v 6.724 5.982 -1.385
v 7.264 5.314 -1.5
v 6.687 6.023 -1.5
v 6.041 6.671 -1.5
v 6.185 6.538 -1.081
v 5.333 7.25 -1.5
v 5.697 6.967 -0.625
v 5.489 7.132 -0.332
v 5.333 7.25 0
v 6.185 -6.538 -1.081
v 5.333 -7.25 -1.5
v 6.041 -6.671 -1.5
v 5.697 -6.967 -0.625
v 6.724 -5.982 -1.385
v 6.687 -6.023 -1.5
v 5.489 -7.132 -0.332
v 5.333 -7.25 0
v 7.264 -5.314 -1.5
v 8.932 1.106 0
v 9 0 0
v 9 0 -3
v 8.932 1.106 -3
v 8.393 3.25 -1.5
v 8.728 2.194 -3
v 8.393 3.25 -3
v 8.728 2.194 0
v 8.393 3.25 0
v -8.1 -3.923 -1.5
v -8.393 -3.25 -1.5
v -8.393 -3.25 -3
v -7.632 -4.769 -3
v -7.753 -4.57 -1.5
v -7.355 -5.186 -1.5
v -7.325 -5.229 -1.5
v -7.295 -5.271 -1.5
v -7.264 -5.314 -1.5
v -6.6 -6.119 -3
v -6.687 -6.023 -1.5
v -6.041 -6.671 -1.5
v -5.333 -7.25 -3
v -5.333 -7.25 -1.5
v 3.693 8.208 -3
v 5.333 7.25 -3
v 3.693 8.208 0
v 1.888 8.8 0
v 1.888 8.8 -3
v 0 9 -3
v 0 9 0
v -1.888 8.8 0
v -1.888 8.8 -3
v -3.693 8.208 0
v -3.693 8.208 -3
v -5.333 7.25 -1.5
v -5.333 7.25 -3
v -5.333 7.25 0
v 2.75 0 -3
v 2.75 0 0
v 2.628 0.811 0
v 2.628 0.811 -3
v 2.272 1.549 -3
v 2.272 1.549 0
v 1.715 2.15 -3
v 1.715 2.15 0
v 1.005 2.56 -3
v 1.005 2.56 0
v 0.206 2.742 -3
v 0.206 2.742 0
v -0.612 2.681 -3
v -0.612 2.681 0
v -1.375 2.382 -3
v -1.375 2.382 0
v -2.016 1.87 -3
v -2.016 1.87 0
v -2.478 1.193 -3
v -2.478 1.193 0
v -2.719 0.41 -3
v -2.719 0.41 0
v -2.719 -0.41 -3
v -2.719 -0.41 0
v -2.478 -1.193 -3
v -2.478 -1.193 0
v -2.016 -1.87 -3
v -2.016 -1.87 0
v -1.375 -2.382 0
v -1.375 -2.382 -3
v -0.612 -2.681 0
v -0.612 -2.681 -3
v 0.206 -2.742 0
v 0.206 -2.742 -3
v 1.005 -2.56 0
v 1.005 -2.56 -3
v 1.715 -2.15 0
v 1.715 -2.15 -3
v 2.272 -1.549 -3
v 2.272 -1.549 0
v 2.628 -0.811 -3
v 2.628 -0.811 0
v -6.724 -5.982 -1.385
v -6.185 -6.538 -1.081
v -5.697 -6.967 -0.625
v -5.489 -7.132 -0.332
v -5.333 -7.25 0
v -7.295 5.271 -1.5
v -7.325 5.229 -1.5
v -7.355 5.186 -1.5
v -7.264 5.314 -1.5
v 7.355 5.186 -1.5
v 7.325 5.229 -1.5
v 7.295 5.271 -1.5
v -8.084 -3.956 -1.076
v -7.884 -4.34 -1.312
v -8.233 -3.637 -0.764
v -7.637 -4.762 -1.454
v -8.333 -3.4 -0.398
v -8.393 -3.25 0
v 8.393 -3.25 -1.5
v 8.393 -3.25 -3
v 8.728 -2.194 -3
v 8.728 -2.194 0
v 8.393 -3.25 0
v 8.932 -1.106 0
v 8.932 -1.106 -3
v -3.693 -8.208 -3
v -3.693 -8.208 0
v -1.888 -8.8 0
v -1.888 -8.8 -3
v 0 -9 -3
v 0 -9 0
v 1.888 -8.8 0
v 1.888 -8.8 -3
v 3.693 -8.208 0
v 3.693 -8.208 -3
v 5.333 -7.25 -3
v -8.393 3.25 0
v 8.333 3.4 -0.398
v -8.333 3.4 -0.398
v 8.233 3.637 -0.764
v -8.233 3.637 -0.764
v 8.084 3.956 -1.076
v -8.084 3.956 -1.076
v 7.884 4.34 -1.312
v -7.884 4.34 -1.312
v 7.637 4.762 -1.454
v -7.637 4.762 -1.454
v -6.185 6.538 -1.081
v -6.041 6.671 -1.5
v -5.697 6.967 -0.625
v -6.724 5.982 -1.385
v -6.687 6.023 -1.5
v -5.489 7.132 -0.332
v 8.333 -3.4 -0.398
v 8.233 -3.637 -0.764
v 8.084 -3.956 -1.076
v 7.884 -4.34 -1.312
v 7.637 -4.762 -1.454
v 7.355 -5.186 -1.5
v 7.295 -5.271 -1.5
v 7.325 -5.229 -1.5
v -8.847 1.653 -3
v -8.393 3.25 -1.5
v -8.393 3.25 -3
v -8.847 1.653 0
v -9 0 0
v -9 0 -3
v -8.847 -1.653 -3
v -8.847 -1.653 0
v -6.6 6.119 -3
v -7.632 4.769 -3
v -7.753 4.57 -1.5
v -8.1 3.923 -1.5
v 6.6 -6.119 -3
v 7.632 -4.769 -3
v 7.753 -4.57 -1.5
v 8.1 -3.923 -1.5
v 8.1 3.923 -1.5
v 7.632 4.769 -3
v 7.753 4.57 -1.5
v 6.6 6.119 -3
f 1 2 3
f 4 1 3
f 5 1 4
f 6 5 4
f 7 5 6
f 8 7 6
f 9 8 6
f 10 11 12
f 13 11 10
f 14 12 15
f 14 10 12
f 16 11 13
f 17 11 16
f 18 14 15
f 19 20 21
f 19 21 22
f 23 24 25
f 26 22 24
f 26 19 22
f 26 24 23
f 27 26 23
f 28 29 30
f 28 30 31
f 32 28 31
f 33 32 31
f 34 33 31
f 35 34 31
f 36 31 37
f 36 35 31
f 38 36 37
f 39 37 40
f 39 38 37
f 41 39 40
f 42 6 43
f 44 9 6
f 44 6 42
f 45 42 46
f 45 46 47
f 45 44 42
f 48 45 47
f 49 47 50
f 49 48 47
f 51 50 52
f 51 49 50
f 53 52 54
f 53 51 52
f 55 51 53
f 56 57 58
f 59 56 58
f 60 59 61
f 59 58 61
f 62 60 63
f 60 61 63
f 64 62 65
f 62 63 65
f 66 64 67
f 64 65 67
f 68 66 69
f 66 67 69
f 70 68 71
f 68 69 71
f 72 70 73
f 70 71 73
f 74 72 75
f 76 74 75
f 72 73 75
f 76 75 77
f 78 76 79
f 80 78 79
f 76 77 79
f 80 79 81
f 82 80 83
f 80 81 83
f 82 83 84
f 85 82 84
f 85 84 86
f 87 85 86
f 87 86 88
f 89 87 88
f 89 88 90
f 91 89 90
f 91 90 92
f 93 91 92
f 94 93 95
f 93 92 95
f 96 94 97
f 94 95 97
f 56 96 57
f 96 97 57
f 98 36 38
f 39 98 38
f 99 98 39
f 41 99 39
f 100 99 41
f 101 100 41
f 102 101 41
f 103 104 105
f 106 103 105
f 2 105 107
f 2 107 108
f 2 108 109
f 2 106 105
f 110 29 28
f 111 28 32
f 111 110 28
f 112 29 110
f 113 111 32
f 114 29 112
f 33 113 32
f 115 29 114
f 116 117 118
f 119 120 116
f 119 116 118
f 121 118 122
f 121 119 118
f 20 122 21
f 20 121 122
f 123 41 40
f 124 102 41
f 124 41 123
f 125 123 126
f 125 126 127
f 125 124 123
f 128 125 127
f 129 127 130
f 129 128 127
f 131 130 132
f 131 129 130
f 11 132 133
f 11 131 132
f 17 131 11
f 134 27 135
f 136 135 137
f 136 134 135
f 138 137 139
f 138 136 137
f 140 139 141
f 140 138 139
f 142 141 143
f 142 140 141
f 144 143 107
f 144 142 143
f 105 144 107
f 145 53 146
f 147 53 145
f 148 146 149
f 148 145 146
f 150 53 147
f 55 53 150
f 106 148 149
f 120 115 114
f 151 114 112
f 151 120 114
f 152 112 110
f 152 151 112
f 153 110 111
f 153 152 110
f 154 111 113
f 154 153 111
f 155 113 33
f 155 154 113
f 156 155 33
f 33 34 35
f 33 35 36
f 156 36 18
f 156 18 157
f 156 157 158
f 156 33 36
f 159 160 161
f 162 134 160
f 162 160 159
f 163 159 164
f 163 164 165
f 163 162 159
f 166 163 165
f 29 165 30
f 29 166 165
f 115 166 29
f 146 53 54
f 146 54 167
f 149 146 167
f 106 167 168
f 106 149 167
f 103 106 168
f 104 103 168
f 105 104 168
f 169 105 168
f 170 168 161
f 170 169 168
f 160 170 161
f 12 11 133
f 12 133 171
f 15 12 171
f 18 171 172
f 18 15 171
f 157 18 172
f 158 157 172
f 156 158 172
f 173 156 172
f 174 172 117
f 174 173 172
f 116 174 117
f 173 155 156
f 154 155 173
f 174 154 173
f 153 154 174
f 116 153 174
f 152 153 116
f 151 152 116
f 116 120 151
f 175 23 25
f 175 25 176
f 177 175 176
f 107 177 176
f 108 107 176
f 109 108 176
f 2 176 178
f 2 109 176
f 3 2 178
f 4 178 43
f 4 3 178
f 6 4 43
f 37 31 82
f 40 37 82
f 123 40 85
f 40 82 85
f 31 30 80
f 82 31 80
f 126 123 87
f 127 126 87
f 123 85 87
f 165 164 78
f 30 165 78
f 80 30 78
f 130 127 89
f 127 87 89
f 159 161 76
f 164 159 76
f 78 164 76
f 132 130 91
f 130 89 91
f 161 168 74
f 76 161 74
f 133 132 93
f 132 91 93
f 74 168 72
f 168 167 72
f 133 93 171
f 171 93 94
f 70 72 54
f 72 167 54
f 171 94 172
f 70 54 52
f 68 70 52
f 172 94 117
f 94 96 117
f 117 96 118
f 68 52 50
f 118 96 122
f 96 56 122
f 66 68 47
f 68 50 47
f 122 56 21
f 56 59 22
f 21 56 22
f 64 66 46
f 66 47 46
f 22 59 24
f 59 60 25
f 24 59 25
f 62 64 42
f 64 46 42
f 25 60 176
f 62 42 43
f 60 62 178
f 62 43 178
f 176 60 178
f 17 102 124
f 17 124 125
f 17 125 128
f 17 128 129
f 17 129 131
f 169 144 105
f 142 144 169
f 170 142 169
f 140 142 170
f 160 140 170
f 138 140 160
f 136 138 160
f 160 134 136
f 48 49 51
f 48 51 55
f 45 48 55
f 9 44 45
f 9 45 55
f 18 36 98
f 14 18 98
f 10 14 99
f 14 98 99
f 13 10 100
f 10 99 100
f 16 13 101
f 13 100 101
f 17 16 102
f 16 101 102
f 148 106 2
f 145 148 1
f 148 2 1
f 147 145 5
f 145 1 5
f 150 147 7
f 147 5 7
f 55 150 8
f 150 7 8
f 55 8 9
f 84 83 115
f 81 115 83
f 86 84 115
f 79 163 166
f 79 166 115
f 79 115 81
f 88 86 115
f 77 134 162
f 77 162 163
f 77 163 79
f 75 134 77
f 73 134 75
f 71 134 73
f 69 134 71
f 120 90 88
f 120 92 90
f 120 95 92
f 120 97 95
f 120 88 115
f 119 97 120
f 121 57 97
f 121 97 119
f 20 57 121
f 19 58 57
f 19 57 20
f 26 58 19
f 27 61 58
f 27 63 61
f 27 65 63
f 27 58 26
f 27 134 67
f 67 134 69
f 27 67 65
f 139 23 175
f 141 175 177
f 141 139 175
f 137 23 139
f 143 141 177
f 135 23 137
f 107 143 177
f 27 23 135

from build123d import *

# Parameters (mm, degrees)
F0_R         = 2.75
F1_DEPTH     = 3
F2_DEPTH     = 1.5
F3_T4_DEPTH  = 26.4678686971
F3_S5_R      = 9
F3_T6_DEPTH  = 15
F3_T10_DEPTH = 20.3478228694
F3_S11_R     = 9
F3_T12_DEPTH = 12
F3_T16_DEPTH = 26.4678686971
F3_S17_R     = 9
F3_T18_DEPTH = 15
F3_T22_DEPTH = 20.3478228694
F3_S23_R     = 9
F3_T24_DEPTH = 12


# Not quite as in the source:
# - a fillet or chamfer that OpenCascade refuses, or shapes differently, is made with other operations: its cross-section is extruded or revolved along the edge and cut away or added


with BuildPart() as f1:
    # F0 (on Top) → F1 (new body)
    with BuildSketch(Plane.XY):
        with BuildLine():
            Line((-5.3326822519, 7.25), (5.3326822519, 7.25))
            ThreePointArc((5.3326822519, 7.25), (0, 9), (-5.3326822519, 7.25))
        make_face()
        with BuildLine():
            Line((-8.3927051658, 3.25), (8.3927051658, 3.25))
            ThreePointArc((8.3927051658, 3.25), (7.1481861295, 5.4684033372), (5.3326822519, 7.25))
            Line((5.3326822519, 7.25), (-5.3326822519, 7.25))
            ThreePointArc((-5.3326822519, 7.25), (-7.1481861295, 5.4684033372), (-8.3927051658, 3.25))
        make_face()
        with BuildLine():
            ThreePointArc((5.3326822519, -7.25), (7.1481861295, -5.4684033372), (8.3927051658, -3.25))
            Line((8.3927051658, -3.25), (-8.3927051658, -3.25))
            ThreePointArc((-8.3927051658, -3.25), (-7.1481861295, -5.4684033372), (-5.3326822519, -7.25))
            Line((-5.3326822519, -7.25), (5.3326822519, -7.25))
        make_face()
        with BuildLine():
            ThreePointArc((-5.3326822519, -7.25), (0, -9), (5.3326822519, -7.25))
            Line((5.3326822519, -7.25), (-5.3326822519, -7.25))
        make_face()
        with BuildLine():
            ThreePointArc((8.3927051658, -3.25), (8.8468736425, -1.6531263575), (9, 0))
            ThreePointArc((9, 0), (8.8468736425, 1.6531263575), (8.3927051658, 3.25))
            Line((8.3927051658, 3.25), (-8.3927051658, 3.25))
            ThreePointArc((-8.3927051658, 3.25), (-9, 0), (-8.3927051658, -3.25))
            Line((-8.3927051658, -3.25), (8.3927051658, -3.25))
        make_face()
        Circle(F0_R, mode=Mode.SUBTRACT)
    extrude(amount=-F1_DEPTH)

    # F0 (on Top) → F2 (cut)
    with BuildSketch(Plane.XY):
        with BuildLine():
            Line((-8.3927051658, 3.25), (8.3927051658, 3.25))
            ThreePointArc((8.3927051658, 3.25), (7.1481861295, 5.4684033372), (5.3326822519, 7.25))
            Line((5.3326822519, 7.25), (-5.3326822519, 7.25))
            ThreePointArc((-5.3326822519, 7.25), (-7.1481861295, 5.4684033372), (-8.3927051658, 3.25))
        make_face()
        with BuildLine():
            ThreePointArc((5.3326822519, -7.25), (7.1481861295, -5.4684033372), (8.3927051658, -3.25))
            Line((8.3927051658, -3.25), (-8.3927051658, -3.25))
            ThreePointArc((-8.3927051658, -3.25), (-7.1481861295, -5.4684033372), (-5.3326822519, -7.25))
            Line((-5.3326822519, -7.25), (5.3326822519, -7.25))
        make_face()
    extrude(amount=-F2_DEPTH, mode=Mode.SUBTRACT)

    # F3: fillet of radius 2 on 4 edges, made by hand


with BuildPart() as f3_tool2:
    # F3_s3 → F3_t4 (new body)
    with BuildSketch(Plane.YZ.offset(-13.2339343486)):
        with BuildLine():
            ThreePointArc((3.25, 0), (3.9617468017, -1.0811388301), (5.1864916731, -1.5))
            Line((5.1864916731, -1.5), (3.25, -1.5))
            Line((3.25, -1.5), (3.25, 0))
        make_face()
    extrude(amount=F3_T4_DEPTH)

    # F3_s5 → F3_t6 (intersect, symmetric)
    with BuildSketch(Plane.XY.offset(-0.8)):
        Circle(F3_S5_R)
    extrude(amount=F3_T6_DEPTH, both=True, mode=Mode.INTERSECT)


with BuildPart() as f1_1:
    add(f1.part)

    # F3_t1: union F3_tool2
    add(f3_tool2.part)


with BuildPart() as f3_tool8:
    # F3_s9 → F3_t10 (new body)
    with BuildSketch(Plane.YZ.offset(10.1739114347)):
        with BuildLine():
            ThreePointArc((5.3135083269, -1.5), (6.5382531983, -1.0811388301), (7.25, 0))
            Line((7.25, 0), (7.25, -1.5))
            Line((7.25, -1.5), (5.3135083269, -1.5))
        make_face()
    extrude(amount=-F3_T10_DEPTH)

    # F3_s11 → F3_t12 (intersect, symmetric)
    with BuildSketch(Plane.XY.offset(-0.8)):
        Circle(F3_S11_R)
    extrude(amount=F3_T12_DEPTH, both=True, mode=Mode.INTERSECT)


with BuildPart() as f1_2:
    add(f1_1.part)

    # F3_t7: union F3_tool8
    add(f3_tool8.part)


with BuildPart() as f3_tool14:
    # F3_s15 → F3_t16 (new body)
    with BuildSketch(Plane.YZ.offset(13.2339343486)):
        with BuildLine():
            ThreePointArc((-3.25, 0), (-3.9617468017, -1.0811388301), (-5.1864916731, -1.5))
            Line((-5.1864916731, -1.5), (-3.25, -1.5))
            Line((-3.25, -1.5), (-3.25, 0))
        make_face()
    extrude(amount=-F3_T16_DEPTH)

    # F3_s17 → F3_t18 (intersect, symmetric)
    with BuildSketch(Plane.XY.offset(-0.8)):
        Circle(F3_S17_R)
    extrude(amount=F3_T18_DEPTH, both=True, mode=Mode.INTERSECT)


with BuildPart() as f1_3:
    add(f1_2.part)

    # F3_t13: union F3_tool14
    add(f3_tool14.part)


with BuildPart() as f3_tool20:
    # F3_s21 → F3_t22 (new body)
    with BuildSketch(Plane.YZ.offset(-10.1739114347)):
        with BuildLine():
            ThreePointArc((-5.3135083269, -1.5), (-6.5382531983, -1.0811388301), (-7.25, 0))
            Line((-7.25, 0), (-7.25, -1.5))
            Line((-7.25, -1.5), (-5.3135083269, -1.5))
        make_face()
    extrude(amount=F3_T22_DEPTH)

    # F3_s23 → F3_t24 (intersect, symmetric)
    with BuildSketch(Plane.XY.offset(-0.8)):
        Circle(F3_S23_R)
    extrude(amount=F3_T24_DEPTH, both=True, mode=Mode.INTERSECT)


with BuildPart() as f1_4:
    add(f1_3.part)

    # F3_t19: union F3_tool20
    add(f3_tool20.part)


solid = f1_4.part
